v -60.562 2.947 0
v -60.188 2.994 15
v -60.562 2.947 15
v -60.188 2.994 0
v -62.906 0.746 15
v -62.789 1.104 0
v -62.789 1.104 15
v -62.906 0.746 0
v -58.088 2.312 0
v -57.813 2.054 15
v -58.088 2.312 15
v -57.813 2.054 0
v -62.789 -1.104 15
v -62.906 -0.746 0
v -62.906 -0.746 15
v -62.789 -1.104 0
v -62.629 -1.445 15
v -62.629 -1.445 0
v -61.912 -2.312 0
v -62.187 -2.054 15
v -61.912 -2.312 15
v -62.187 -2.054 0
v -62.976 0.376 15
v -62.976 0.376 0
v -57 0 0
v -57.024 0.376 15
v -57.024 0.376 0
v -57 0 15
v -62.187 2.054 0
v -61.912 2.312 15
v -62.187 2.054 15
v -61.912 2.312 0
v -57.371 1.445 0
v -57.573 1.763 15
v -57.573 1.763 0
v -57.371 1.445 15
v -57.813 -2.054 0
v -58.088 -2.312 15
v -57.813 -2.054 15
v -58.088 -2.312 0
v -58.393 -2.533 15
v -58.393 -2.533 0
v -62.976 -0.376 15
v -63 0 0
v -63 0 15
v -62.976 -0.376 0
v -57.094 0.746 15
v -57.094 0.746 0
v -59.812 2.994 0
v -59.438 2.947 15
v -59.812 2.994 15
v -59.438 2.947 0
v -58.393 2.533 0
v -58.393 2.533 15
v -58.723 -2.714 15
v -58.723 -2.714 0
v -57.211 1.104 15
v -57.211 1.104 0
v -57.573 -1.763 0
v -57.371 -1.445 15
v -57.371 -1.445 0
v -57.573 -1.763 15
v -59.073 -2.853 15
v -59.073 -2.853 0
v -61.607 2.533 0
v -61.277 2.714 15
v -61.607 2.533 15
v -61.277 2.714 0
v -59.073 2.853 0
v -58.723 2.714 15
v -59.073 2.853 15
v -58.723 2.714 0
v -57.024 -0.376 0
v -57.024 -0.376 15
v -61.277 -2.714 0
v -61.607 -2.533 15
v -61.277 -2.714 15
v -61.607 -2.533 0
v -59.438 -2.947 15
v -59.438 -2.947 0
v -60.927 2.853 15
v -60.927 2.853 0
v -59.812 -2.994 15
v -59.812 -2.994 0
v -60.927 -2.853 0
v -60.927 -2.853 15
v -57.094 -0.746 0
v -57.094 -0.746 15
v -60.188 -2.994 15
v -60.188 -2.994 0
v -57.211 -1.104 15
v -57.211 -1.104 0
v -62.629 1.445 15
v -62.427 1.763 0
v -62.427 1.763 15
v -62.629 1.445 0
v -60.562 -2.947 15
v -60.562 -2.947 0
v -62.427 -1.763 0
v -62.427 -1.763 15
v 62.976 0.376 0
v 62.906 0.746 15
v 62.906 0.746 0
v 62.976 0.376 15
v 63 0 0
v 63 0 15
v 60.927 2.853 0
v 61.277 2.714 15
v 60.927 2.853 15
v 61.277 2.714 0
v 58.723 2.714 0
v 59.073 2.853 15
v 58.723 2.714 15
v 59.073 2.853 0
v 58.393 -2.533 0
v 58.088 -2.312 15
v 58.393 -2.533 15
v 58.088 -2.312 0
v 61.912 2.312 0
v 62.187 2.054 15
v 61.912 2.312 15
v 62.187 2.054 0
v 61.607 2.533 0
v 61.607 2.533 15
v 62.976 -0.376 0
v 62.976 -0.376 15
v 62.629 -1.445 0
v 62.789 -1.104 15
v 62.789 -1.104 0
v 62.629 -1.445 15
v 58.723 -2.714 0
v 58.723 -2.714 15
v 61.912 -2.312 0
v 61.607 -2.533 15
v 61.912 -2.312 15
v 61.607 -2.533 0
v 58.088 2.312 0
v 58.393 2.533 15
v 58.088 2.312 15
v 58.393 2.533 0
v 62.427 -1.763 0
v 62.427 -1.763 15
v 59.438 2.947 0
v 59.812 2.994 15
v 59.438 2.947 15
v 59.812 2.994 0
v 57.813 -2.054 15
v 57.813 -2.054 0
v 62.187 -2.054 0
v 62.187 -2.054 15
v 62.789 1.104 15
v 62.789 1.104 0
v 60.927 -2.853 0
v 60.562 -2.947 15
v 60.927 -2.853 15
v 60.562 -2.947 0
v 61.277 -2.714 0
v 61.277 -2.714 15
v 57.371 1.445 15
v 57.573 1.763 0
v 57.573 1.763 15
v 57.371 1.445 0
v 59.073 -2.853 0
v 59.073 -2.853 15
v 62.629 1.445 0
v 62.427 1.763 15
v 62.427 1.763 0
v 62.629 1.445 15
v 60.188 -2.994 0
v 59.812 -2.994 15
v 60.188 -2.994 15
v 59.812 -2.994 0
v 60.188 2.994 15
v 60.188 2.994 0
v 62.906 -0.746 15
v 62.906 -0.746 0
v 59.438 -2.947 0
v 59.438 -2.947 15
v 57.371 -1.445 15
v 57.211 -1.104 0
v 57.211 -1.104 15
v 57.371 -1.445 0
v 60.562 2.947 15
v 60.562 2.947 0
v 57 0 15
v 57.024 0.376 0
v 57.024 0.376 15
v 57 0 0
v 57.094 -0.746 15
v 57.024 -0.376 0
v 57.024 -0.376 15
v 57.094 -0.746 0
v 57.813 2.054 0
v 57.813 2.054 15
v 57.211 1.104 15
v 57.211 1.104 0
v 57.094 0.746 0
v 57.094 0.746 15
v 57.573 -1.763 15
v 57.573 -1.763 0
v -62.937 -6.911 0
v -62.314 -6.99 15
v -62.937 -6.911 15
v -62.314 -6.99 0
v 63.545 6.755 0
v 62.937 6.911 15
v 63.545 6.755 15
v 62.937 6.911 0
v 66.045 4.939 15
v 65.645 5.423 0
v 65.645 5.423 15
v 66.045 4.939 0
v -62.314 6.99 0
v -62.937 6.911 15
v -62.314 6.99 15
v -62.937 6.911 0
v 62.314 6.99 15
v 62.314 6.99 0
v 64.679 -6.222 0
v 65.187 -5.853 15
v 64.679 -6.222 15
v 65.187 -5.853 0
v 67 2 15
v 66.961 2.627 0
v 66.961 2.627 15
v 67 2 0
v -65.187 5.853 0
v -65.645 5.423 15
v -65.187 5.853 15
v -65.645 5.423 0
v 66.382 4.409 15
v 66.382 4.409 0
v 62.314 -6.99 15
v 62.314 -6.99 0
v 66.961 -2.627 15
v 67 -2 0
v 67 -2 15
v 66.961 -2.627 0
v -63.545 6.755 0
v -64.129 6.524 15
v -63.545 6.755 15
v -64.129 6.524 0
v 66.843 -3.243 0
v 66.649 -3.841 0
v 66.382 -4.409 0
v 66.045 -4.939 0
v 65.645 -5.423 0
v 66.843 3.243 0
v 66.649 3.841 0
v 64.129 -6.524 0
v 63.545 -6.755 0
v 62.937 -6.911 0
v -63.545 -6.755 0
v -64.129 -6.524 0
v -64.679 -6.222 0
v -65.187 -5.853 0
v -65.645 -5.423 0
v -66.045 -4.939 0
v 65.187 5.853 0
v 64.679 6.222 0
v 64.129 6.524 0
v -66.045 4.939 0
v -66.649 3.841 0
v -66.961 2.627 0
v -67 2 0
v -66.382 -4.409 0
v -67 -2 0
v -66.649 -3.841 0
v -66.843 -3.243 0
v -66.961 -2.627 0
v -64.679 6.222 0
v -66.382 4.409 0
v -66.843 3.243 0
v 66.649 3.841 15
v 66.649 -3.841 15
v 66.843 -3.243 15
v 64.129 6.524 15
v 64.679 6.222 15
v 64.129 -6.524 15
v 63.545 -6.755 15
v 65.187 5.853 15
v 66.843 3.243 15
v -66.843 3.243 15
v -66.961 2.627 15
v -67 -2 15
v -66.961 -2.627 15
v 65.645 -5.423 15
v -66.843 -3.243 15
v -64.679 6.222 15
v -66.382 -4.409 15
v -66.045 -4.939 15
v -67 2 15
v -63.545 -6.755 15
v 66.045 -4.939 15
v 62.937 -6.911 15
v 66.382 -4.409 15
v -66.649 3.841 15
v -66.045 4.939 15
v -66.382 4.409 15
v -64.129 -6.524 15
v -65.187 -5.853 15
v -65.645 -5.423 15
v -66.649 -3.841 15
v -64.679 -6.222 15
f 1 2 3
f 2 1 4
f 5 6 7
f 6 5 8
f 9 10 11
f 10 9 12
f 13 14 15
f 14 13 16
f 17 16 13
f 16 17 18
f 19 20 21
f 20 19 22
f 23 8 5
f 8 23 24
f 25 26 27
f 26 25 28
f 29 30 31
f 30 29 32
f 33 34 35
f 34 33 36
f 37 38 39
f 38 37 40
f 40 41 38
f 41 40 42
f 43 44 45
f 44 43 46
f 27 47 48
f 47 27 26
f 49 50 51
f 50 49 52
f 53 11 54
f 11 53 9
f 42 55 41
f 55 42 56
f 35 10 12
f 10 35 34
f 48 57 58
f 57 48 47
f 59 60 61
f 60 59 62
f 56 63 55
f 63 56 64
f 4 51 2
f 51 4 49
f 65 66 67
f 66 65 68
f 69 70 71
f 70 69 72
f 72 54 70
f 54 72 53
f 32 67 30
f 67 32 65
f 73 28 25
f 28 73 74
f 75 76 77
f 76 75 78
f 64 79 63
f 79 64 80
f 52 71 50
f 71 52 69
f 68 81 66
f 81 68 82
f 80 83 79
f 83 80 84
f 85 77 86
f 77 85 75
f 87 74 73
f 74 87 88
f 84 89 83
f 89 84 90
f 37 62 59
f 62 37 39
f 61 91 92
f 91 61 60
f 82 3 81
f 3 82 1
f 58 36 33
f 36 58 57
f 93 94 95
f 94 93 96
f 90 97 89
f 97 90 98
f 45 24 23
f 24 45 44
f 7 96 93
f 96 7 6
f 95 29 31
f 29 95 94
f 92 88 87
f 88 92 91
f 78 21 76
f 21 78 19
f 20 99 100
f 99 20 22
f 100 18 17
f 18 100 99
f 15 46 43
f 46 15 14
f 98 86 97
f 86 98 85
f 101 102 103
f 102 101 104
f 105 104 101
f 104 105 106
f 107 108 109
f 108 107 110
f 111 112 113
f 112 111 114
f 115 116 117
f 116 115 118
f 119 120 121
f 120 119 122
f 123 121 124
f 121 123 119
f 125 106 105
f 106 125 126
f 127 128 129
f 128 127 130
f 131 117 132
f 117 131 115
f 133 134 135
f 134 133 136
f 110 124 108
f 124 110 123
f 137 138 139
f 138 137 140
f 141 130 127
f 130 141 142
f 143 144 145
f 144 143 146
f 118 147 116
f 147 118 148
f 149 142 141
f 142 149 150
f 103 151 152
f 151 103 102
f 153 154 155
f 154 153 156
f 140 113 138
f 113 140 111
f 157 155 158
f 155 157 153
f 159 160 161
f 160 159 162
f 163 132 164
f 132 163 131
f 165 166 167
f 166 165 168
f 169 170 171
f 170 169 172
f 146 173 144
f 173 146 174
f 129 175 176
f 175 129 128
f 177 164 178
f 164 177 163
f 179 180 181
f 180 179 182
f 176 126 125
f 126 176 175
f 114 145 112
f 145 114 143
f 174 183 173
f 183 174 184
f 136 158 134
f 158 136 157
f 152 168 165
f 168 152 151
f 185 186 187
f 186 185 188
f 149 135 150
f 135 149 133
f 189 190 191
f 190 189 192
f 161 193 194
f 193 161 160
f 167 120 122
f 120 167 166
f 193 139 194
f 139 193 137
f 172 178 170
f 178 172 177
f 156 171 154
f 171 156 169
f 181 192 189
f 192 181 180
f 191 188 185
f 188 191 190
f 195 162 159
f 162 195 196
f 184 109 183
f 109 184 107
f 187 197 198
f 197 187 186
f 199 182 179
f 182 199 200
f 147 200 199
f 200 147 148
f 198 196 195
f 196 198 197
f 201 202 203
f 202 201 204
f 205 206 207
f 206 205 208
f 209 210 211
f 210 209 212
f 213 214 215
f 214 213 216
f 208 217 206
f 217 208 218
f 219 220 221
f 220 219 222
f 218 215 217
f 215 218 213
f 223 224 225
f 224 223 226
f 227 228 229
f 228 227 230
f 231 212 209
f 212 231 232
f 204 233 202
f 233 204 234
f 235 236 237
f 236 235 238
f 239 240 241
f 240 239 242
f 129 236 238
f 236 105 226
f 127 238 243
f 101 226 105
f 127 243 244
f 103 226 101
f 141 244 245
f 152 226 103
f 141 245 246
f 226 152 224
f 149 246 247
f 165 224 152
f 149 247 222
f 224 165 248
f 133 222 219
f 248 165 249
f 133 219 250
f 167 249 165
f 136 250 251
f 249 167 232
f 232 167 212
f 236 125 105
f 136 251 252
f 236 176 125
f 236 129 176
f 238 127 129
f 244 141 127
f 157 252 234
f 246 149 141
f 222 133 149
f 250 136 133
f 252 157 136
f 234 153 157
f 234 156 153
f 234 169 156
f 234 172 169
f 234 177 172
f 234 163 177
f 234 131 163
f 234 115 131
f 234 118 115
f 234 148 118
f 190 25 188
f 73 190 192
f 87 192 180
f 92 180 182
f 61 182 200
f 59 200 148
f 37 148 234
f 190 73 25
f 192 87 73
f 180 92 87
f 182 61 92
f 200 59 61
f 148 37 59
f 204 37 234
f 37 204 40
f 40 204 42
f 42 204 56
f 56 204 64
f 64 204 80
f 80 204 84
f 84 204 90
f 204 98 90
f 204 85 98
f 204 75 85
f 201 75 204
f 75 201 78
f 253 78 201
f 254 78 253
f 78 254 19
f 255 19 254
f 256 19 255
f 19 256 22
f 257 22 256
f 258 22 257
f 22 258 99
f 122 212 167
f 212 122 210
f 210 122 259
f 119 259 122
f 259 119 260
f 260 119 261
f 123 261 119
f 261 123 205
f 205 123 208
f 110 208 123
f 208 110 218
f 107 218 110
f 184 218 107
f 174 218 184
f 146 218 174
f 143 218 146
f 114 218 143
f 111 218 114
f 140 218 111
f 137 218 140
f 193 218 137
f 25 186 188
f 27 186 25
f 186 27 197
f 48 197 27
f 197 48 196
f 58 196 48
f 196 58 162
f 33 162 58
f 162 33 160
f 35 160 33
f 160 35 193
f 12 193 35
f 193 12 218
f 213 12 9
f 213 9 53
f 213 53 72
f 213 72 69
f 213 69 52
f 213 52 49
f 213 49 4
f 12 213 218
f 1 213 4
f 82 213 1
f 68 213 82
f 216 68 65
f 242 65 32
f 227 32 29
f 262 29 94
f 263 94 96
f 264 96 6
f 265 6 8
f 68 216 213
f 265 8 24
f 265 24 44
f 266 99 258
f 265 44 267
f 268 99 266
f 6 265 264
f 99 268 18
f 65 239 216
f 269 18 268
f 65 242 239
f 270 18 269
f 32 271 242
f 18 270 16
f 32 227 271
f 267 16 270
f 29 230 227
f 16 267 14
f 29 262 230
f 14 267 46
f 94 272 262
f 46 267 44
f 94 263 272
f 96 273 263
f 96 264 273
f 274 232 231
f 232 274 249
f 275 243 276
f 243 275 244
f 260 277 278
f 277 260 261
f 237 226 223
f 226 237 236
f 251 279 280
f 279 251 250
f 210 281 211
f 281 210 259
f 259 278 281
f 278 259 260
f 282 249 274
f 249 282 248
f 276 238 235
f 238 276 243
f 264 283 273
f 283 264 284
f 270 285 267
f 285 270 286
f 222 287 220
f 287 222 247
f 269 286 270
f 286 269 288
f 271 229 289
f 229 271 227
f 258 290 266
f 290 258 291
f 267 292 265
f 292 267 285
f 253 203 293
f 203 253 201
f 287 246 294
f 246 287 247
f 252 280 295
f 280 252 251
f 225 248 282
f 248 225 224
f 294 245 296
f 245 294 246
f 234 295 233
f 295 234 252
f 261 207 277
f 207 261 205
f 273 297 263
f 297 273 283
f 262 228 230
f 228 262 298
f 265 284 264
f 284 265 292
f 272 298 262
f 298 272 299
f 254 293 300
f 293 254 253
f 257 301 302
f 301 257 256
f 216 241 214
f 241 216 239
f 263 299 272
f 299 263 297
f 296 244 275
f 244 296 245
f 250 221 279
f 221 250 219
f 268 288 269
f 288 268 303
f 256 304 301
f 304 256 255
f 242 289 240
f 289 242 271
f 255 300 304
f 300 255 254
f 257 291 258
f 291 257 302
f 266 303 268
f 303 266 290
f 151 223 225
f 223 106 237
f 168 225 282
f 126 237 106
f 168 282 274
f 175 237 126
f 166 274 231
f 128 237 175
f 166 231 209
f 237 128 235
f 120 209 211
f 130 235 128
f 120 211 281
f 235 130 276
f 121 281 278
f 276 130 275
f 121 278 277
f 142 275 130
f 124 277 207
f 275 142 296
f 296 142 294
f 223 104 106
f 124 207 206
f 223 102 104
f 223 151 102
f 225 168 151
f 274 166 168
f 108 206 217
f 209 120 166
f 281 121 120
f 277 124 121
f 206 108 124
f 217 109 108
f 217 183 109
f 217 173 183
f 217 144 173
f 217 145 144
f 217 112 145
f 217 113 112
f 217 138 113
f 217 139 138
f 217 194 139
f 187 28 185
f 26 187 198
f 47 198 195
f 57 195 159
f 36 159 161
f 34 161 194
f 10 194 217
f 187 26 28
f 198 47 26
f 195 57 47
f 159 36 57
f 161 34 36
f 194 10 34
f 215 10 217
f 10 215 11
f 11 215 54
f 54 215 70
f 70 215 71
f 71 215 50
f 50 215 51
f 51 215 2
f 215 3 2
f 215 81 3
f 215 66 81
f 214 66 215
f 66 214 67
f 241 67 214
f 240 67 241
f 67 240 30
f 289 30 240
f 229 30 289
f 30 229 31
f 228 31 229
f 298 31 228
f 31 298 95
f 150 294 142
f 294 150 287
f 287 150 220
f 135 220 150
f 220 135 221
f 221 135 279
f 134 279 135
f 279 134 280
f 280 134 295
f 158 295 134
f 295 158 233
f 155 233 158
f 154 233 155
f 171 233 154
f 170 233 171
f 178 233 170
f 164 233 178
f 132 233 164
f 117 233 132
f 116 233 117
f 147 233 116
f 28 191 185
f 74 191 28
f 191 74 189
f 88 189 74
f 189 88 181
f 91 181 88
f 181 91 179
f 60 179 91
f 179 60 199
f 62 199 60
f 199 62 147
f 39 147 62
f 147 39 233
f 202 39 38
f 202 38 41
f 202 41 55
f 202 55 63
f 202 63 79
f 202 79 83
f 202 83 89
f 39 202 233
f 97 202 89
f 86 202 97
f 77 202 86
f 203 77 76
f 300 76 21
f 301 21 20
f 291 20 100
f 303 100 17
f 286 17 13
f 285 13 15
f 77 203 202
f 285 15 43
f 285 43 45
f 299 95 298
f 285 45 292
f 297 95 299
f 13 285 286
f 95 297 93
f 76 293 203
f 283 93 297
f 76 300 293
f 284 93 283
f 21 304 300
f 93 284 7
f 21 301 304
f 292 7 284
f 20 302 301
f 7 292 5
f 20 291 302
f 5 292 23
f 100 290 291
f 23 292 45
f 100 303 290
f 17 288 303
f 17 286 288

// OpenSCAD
$fn = 50;


difference() {
	union() {
		hull() {
			translate(v = [-62.0000000000, 2.0000000000, 0]) {
				cylinder(h = 15, r = 5);
			}
			translate(v = [62.0000000000, 2.0000000000, 0]) {
				cylinder(h = 15, r = 5);
			}
			translate(v = [-62.0000000000, -2.0000000000, 0]) {
				cylinder(h = 15, r = 5);
			}
			translate(v = [62.0000000000, -2.0000000000, 0]) {
				cylinder(h = 15, r = 5);
			}
		}
	}
	union() {
		translate(v = [-60.0000000000, 0.0000000000, -100.0000000000]) {
			cylinder(h = 200, r = 3.0000000000);
		}
		translate(v = [-60.0000000000, 0.0000000000, -100.0000000000]) {
			cylinder(h = 200, r = 3.0000000000);
		}
		translate(v = [60.0000000000, 0.0000000000, -100.0000000000]) {
			cylinder(h = 200, r = 3.0000000000);
		}
		translate(v = [60.0000000000, 0.0000000000, -100.0000000000]) {
			cylinder(h = 200, r = 3.0000000000);
		}
	}
}
